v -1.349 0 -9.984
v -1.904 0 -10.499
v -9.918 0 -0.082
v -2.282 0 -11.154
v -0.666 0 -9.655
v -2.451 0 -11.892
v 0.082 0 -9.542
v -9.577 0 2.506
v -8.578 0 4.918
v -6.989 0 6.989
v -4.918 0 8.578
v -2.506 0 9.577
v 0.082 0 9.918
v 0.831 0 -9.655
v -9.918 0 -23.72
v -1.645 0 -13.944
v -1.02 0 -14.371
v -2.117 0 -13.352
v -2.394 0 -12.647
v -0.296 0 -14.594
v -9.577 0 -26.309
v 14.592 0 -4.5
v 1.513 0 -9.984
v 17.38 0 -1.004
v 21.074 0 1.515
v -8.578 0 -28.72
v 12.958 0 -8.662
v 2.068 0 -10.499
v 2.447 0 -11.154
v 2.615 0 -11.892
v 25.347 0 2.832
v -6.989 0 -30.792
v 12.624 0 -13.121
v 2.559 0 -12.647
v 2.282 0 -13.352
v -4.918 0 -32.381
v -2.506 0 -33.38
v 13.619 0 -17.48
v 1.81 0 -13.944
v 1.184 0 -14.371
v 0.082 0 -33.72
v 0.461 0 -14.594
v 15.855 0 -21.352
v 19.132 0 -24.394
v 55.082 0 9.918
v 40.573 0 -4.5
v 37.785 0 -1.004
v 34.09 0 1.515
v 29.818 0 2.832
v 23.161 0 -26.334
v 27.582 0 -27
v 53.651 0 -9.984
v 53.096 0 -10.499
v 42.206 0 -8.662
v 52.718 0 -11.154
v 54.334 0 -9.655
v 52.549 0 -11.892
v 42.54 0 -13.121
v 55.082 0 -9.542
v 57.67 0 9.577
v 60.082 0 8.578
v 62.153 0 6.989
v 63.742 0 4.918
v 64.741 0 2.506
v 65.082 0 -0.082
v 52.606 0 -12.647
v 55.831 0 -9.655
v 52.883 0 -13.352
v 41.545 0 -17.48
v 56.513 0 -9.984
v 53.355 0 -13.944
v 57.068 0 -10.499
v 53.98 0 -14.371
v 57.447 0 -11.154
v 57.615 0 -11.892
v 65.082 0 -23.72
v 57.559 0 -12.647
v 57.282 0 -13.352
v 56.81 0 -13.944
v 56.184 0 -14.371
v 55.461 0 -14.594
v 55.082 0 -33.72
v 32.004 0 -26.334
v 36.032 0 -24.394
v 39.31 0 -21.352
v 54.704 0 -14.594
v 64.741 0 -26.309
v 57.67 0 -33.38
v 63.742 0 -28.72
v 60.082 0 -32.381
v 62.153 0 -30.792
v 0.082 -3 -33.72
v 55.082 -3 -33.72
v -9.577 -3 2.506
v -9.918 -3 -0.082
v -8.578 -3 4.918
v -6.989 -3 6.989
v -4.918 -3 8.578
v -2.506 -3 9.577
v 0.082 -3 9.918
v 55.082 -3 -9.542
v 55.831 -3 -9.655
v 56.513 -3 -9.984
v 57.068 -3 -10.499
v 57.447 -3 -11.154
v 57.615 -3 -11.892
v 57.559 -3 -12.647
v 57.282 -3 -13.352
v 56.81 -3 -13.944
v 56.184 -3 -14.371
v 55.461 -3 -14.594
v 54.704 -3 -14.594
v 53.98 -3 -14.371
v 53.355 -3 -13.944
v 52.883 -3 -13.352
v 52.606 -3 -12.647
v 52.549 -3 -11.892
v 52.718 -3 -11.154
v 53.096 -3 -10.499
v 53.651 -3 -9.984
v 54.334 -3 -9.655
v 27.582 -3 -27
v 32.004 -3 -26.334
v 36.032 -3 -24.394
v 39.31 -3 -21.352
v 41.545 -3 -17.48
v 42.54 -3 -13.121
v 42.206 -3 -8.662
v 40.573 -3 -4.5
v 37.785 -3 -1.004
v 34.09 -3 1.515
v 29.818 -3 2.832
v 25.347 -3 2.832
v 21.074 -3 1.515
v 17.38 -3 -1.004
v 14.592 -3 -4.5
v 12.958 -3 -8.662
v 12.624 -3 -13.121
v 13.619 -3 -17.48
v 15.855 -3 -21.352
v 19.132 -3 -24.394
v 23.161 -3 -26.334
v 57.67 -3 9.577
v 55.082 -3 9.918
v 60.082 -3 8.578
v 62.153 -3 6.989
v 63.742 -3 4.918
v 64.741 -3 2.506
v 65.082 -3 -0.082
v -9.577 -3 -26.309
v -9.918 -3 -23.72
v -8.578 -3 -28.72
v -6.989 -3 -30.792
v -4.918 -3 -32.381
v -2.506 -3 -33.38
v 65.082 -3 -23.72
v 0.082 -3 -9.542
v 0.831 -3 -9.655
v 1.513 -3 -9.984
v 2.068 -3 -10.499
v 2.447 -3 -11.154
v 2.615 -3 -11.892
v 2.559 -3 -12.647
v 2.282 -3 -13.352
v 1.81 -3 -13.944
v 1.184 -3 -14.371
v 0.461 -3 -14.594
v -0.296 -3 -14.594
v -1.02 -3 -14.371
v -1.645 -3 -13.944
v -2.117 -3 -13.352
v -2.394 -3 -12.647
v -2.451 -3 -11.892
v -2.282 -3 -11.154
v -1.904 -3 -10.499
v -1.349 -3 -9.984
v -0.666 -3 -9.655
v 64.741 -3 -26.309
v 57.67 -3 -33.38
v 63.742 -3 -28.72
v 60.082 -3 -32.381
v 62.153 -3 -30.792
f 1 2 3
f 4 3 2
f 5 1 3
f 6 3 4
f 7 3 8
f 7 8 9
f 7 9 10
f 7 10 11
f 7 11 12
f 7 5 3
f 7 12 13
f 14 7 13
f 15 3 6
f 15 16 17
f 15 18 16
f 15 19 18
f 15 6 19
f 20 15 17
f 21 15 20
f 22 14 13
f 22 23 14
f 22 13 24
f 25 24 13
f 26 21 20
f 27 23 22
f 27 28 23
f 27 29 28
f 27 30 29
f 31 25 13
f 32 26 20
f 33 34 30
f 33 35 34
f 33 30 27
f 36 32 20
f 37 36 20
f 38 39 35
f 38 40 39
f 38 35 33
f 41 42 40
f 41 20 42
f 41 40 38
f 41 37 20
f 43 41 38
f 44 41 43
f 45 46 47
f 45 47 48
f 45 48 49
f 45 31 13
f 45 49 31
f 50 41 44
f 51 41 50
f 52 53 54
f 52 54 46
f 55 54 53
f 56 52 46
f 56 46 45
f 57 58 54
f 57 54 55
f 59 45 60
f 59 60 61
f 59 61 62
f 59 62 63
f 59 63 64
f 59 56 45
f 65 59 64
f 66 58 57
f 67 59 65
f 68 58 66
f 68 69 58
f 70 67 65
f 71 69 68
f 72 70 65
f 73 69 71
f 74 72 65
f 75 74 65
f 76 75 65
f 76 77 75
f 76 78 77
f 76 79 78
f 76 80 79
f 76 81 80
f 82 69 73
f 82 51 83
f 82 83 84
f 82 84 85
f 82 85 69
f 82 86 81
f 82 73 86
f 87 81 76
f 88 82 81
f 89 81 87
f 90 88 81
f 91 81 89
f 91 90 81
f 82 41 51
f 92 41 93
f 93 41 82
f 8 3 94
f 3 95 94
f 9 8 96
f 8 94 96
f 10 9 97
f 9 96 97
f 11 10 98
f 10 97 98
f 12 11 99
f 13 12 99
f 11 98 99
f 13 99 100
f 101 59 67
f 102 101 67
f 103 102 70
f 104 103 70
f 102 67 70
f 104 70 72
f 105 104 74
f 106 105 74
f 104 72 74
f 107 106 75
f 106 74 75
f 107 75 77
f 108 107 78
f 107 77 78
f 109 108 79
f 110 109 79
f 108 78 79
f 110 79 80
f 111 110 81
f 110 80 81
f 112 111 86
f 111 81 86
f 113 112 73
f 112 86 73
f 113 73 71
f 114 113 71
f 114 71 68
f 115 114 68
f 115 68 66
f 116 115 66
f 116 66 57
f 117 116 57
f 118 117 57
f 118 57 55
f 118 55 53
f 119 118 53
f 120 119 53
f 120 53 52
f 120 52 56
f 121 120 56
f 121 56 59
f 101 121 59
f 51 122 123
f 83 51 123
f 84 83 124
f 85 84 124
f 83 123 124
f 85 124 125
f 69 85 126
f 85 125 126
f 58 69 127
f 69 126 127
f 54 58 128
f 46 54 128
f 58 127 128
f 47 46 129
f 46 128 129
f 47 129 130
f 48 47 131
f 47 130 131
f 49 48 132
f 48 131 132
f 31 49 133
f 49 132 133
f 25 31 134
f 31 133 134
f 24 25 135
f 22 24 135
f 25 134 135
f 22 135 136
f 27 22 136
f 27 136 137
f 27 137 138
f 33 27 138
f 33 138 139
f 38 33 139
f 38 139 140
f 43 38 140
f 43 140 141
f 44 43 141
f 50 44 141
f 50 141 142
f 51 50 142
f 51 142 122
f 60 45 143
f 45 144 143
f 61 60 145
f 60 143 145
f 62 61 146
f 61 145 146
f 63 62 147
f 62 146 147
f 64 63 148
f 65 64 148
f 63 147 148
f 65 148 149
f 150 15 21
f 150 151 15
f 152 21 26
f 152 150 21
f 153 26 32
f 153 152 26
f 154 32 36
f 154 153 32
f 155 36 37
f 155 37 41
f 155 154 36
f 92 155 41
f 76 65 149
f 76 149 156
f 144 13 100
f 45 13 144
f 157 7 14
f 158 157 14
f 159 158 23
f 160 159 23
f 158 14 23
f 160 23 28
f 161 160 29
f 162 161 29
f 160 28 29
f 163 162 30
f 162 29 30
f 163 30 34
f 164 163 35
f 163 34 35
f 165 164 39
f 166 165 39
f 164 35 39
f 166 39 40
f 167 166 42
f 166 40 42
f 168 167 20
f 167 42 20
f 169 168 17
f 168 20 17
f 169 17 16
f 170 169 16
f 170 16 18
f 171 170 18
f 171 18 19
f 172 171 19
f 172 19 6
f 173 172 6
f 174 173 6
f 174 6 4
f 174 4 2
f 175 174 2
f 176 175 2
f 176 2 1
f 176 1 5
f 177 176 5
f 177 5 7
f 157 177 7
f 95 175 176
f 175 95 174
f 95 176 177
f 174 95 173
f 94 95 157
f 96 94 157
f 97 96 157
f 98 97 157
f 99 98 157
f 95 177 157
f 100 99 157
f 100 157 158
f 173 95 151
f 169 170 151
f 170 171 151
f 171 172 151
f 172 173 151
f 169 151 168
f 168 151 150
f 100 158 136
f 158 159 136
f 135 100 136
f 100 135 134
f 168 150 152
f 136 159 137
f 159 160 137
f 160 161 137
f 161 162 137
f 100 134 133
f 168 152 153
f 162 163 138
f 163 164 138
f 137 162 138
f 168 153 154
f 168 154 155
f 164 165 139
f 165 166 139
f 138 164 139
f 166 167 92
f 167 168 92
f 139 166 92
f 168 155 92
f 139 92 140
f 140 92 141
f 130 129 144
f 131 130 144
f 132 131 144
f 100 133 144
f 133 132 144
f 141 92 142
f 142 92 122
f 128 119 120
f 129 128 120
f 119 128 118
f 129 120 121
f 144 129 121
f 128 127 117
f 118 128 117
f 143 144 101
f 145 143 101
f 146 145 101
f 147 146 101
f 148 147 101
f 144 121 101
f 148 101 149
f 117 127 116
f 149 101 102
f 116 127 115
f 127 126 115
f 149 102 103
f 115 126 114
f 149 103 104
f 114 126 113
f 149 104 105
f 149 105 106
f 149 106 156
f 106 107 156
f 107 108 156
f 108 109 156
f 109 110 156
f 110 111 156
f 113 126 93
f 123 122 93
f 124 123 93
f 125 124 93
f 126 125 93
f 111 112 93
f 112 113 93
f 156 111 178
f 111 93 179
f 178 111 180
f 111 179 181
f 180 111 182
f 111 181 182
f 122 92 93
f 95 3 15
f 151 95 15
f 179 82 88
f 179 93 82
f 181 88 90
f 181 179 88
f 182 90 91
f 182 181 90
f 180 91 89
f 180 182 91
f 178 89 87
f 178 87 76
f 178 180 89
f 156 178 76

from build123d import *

# Parameters (mm, degrees)
SKETCH_1_W             = 75
SKETCH_1_H             = 43.638217254
SM_BASE_FLANGE_1_DEPTH = 3
SKETCH_8_R             = 15
CUT_EXTRUDE_1_DEPTH    = 74.36050648
FILLET_1_R             = 10
SKETCH_9_R             = 2.54
CUT_EXTRUDE_2_DEPTH    = 10


# Sheet-metal steps are written as plain solids
with BuildPart() as part:
    # Sketch 1 → 基体-法兰1 (new body)
    with BuildSketch(Plane(origin=(0, 0, 0), x_dir=(1, 0, 0), z_dir=(0, 1, 0))):
        with Locations((27.582223351, 11.901331978)):
            Rectangle(SKETCH_1_W, SKETCH_1_H)
    extrude(amount=-SM_BASE_FLANGE_1_DEPTH)

    # 草图8 → 切除-拉伸1 (cut, through all)
    with BuildSketch(Plane(origin=(0, -3, 0), x_dir=(-1, 0, 0), z_dir=(0, -1, 0))):
        with Locations(Location((-27.582223351, 12, 0), (0, 0, 90))):
            Circle(SKETCH_8_R)
    extrude(amount=-CUT_EXTRUDE_1_DEPTH, mode=Mode.SUBTRACT)

    # 圆角1
    fillet_1_edges = [part.edges().sort_by_distance(p)[0] for p in [
        (65.082223351, -1.5, 9.917776649),
        (-9.917776649, -1.5, 9.917776649),
        (-9.917776649, -1.5, -33.720440605),
        (65.082223351, -1.5, -33.720440605),
    ]]
    fillet(fillet_1_edges, radius=FILLET_1_R)

    # 草图9 → 切除-拉伸2 (cut)
    with BuildSketch(Plane(origin=(0, 0, 0), x_dir=(1, 0, 0), z_dir=(0, 1, 0))):
        with Locations(Location((0.082223351, 12.082223351, 0), (0, 0, 270))):
            Circle(SKETCH_9_R)
        with Locations(Location((55.082223351, 12.082223351, 0), (0, 0, 270))):
            Circle(SKETCH_9_R)
    extrude(amount=-CUT_EXTRUDE_2_DEPTH, mode=Mode.SUBTRACT)


solid = part.part
